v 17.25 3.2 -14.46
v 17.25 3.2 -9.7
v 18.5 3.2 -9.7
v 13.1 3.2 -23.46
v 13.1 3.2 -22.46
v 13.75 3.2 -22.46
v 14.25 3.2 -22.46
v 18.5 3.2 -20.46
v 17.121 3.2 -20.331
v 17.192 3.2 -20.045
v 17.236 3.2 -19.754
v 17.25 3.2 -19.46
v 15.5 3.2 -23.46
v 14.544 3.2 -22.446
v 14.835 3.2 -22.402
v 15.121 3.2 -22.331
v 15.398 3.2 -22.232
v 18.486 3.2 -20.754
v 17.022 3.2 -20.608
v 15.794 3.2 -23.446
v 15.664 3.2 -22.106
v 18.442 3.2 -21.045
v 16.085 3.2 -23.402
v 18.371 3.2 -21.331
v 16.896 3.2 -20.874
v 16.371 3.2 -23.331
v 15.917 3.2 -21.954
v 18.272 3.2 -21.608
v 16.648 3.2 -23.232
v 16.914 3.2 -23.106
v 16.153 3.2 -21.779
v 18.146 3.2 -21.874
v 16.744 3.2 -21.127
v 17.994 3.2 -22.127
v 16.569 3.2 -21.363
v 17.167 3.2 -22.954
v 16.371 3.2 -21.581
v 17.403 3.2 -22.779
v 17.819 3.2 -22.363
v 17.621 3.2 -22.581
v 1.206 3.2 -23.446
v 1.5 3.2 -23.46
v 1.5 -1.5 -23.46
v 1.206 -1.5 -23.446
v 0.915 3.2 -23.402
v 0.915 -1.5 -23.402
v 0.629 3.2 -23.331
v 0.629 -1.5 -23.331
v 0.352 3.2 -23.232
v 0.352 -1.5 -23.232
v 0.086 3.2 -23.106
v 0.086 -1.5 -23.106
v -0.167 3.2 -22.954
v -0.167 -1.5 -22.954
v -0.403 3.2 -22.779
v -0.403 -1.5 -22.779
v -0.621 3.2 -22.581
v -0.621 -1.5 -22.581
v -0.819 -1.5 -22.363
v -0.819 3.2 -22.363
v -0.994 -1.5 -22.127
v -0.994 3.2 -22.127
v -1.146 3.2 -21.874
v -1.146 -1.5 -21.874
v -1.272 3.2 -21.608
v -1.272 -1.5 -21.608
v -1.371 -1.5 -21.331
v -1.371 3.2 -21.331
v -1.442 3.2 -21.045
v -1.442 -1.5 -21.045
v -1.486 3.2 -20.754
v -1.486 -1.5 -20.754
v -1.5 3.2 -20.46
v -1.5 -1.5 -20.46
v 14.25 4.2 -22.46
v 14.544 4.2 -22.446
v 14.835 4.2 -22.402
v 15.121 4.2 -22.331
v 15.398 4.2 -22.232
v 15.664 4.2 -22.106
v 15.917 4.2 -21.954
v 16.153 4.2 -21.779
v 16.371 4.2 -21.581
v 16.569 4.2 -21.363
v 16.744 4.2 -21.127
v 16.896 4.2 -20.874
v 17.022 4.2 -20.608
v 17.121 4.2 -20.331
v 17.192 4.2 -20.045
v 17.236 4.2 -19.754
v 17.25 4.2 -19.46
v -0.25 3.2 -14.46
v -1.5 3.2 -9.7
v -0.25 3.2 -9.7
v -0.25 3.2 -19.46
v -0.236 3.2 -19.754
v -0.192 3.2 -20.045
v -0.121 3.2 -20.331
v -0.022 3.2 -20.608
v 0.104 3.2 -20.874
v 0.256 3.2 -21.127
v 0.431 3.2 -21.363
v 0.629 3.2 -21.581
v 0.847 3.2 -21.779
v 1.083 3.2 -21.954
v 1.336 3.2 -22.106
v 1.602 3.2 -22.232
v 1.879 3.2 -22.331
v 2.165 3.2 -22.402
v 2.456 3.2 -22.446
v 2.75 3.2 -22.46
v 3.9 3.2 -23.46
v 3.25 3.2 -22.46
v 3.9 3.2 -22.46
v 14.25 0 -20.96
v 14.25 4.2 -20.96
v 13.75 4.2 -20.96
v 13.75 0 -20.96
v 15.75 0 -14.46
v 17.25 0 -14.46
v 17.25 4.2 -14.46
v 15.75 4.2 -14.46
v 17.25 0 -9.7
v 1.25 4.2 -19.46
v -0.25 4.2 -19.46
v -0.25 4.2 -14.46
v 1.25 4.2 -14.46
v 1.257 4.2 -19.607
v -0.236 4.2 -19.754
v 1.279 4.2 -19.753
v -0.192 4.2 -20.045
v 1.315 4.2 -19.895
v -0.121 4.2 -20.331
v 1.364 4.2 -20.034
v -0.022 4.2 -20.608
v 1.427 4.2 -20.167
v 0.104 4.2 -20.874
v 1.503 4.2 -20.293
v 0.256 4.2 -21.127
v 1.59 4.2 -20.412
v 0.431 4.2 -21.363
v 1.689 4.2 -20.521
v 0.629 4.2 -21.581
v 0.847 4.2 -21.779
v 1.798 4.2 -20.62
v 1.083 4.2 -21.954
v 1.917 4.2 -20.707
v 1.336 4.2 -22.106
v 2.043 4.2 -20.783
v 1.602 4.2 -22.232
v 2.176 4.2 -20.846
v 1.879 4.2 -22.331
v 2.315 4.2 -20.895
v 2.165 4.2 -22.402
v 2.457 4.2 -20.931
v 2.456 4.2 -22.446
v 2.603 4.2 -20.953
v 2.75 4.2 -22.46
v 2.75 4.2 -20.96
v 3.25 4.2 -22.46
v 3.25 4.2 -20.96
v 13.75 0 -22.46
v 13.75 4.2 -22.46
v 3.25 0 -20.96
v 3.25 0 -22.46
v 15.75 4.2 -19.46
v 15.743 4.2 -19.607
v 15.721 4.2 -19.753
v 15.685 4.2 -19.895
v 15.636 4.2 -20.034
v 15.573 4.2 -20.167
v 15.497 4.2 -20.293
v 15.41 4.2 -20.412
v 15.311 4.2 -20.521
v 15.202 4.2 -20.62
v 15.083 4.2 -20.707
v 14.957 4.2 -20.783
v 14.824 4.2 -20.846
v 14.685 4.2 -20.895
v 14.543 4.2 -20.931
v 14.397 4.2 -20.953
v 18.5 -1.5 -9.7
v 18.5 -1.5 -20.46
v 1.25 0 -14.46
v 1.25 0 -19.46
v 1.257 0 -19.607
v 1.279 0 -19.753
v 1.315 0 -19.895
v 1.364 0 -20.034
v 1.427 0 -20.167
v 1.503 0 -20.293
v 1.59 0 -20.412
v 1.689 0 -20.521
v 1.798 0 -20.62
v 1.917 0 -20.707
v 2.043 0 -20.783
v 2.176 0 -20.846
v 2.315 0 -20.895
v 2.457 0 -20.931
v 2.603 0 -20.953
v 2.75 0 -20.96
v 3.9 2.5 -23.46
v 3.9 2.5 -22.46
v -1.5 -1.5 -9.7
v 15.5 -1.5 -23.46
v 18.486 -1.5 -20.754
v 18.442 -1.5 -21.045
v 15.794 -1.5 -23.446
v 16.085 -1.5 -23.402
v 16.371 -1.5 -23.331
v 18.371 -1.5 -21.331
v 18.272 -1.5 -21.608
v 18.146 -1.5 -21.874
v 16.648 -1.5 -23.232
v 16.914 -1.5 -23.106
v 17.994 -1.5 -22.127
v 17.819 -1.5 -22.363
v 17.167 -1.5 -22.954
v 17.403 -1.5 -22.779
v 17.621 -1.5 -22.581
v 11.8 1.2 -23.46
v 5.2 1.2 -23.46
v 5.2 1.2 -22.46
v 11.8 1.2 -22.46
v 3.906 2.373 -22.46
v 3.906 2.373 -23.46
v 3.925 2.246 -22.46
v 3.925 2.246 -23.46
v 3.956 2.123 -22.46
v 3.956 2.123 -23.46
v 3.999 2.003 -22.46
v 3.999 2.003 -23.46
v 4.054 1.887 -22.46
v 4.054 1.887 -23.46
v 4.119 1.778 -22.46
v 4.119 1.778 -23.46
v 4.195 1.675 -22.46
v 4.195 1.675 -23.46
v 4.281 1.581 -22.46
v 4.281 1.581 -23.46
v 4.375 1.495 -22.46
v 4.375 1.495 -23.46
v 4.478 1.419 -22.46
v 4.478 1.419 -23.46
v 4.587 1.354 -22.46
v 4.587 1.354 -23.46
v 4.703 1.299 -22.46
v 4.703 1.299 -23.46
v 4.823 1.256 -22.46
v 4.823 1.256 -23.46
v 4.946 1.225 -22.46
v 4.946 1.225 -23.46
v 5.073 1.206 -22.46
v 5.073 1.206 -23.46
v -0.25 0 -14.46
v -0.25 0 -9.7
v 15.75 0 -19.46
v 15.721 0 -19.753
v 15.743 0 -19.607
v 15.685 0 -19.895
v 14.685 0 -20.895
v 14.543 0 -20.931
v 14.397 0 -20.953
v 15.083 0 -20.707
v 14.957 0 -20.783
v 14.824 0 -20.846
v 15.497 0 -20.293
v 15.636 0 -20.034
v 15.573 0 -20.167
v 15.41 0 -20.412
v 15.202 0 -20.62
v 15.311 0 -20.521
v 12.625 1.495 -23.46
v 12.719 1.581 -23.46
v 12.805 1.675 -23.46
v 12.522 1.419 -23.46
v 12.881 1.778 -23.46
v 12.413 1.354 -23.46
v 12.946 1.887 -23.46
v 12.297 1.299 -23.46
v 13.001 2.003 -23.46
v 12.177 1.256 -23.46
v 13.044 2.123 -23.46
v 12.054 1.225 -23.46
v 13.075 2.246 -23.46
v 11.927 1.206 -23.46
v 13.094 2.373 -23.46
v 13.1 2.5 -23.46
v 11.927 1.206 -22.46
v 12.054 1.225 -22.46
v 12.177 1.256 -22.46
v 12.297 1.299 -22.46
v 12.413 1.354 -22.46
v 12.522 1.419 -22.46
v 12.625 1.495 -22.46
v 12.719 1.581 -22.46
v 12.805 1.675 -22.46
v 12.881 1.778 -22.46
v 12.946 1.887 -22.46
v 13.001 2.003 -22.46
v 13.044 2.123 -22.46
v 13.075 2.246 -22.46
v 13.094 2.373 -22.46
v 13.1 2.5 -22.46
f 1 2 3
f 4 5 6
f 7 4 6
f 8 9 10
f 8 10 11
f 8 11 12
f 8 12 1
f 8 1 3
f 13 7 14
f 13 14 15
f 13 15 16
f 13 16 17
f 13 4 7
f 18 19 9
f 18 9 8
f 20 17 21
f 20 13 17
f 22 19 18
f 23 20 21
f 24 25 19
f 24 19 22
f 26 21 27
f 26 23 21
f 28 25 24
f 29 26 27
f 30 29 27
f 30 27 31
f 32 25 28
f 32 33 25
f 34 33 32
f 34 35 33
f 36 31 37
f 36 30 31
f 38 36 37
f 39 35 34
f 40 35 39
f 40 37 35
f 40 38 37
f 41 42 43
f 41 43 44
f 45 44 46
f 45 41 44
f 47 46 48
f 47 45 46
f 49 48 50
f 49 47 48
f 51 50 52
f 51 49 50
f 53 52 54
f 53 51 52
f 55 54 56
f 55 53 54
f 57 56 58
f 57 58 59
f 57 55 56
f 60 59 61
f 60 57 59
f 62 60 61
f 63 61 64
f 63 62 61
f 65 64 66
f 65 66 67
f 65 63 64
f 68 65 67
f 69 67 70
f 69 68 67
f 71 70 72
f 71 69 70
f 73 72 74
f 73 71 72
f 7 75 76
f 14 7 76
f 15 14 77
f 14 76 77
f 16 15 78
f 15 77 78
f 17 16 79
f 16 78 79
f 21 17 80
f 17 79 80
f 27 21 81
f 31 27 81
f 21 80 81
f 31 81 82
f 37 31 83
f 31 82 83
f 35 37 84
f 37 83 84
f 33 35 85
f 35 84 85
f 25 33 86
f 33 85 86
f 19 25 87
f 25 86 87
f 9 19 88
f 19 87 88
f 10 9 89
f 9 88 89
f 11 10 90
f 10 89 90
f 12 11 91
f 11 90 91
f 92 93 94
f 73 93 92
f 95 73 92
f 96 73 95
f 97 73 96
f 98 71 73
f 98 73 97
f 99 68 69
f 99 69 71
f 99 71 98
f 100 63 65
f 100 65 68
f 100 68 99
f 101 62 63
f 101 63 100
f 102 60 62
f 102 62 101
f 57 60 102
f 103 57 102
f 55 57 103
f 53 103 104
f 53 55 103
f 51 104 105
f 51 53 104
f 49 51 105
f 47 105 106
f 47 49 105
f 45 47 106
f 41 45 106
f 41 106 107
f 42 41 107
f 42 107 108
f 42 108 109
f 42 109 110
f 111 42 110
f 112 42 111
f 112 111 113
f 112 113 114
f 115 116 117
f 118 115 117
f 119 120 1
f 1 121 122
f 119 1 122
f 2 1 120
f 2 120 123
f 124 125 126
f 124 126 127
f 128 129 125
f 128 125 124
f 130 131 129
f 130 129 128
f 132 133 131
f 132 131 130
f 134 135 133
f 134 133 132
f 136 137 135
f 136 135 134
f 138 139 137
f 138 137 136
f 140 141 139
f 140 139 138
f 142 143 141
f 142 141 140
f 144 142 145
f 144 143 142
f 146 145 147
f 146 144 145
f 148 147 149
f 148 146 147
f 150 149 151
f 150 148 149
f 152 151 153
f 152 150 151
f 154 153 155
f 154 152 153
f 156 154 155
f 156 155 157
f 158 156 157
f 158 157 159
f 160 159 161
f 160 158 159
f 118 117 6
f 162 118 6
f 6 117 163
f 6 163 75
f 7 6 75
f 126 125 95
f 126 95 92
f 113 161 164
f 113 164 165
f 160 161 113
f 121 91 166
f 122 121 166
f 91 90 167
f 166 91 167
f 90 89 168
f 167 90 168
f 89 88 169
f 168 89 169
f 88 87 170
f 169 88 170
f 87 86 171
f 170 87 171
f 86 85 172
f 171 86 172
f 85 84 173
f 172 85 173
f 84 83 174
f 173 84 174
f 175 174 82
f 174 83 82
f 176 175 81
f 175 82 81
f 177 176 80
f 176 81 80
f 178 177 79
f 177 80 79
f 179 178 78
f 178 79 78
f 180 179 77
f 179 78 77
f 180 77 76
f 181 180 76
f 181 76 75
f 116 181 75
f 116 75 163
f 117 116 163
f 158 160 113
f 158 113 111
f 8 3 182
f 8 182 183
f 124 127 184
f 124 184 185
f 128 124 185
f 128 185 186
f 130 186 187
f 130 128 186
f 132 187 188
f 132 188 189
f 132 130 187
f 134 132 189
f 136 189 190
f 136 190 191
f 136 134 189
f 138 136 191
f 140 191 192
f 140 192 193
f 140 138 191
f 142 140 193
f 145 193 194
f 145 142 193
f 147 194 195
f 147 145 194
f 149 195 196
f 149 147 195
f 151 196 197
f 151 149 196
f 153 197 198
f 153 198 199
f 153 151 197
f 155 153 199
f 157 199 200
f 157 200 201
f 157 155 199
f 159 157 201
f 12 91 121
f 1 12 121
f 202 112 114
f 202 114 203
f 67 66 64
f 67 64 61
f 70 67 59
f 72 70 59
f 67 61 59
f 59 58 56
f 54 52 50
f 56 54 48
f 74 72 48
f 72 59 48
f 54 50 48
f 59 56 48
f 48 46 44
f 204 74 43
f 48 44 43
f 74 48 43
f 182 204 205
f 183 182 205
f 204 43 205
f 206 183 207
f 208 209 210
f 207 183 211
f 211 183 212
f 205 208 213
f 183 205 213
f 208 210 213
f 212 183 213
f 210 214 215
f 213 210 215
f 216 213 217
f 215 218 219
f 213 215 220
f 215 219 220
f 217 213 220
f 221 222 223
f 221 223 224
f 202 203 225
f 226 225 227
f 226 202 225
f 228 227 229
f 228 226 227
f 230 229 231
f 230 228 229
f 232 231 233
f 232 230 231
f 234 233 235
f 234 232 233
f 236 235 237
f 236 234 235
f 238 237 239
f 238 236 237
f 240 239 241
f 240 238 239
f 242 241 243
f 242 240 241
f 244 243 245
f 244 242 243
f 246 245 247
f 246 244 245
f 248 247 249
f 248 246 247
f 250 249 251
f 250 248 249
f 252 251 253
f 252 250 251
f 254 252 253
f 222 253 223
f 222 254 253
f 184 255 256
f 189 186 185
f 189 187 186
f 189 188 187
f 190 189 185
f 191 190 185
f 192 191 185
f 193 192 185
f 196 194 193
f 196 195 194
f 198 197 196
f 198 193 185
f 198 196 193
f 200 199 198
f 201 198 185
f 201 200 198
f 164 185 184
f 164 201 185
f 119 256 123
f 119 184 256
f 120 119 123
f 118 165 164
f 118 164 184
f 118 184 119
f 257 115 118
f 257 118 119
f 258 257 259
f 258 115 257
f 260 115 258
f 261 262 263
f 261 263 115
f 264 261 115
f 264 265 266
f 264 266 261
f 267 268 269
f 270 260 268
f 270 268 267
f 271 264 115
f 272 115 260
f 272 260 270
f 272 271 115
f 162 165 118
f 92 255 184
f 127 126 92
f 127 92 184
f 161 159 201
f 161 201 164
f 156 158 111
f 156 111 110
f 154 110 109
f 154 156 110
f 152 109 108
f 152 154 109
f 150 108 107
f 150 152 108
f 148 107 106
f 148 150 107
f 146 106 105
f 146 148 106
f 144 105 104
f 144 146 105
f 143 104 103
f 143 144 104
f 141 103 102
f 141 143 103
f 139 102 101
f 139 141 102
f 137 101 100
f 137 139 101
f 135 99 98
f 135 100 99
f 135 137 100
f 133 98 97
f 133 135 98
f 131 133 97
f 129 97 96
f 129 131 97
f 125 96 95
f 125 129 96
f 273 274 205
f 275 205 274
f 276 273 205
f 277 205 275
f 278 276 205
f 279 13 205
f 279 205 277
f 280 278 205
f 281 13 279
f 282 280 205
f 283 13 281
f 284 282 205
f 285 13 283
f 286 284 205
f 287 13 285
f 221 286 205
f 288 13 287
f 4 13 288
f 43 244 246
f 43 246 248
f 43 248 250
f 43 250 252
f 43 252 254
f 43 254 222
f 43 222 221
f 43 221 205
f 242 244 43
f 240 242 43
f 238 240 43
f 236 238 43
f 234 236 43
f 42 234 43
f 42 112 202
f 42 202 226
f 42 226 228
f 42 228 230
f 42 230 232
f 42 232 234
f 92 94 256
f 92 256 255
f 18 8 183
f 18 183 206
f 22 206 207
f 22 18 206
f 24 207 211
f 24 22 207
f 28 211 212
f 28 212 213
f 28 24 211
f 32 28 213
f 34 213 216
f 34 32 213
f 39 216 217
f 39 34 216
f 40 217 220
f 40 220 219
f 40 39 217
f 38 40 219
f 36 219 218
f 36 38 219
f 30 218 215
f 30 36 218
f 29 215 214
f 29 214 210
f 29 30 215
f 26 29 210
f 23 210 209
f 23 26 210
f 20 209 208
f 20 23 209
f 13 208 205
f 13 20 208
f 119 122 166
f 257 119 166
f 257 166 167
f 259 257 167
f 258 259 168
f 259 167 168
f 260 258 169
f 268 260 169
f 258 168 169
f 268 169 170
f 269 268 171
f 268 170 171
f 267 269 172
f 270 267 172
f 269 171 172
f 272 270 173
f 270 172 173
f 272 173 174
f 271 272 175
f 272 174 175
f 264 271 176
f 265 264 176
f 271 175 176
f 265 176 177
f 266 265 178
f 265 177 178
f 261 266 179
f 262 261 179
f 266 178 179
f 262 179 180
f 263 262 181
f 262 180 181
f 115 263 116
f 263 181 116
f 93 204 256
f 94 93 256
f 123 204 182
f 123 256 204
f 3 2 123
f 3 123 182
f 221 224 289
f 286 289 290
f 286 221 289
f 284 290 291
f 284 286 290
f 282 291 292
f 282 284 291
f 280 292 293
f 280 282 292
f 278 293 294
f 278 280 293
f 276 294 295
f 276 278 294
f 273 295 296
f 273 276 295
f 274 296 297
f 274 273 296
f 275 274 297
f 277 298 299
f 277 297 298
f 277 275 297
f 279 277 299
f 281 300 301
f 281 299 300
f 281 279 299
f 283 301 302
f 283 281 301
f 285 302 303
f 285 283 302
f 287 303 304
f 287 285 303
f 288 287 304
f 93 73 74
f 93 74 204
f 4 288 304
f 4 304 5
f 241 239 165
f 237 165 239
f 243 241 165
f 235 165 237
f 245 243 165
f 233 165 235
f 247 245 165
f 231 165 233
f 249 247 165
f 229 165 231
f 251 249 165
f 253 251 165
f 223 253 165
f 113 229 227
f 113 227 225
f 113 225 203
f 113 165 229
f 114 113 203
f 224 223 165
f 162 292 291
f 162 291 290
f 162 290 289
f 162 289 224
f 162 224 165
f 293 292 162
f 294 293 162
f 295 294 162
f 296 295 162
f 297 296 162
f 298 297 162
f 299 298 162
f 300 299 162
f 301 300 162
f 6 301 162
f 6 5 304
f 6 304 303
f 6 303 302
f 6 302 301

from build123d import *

# Parameters (mm, degrees)
BOSS_EXTRUDE1_DEPTH = 1.5
BOSS_EXTRUDE2_START = 3.2
BOSS_EXTRUDE2_DEPTH = 3.2
BOSS_EXTRUDE3_START = 4.2
BOSS_EXTRUDE3_DEPTH = 4.2
CUT_EXTRUDE1_DEPTH  = 24.43560539


with BuildPart() as part:
    # Sketch1 → Boss-Extrude1 (new body)
    with BuildSketch(Plane(origin=(0, 0, 0), x_dir=(1, 0, 0), z_dir=(0, 1, 0))):
        with BuildLine():
            Line((-1.5, 20.46), (-1.5, 9.7))
            Line((-1.5, 9.7), (18.5, 9.7))
            Line((18.5, 9.7), (18.5, 20.46))
            ThreePointArc((18.5, 20.46), (17.621320344, 22.581320344), (15.5, 23.46))
            Line((15.5, 23.46), (1.5, 23.46))
            ThreePointArc((1.5, 23.46), (-0.621320344, 22.581320344), (-1.5, 20.46))
        make_face()
    extrude(amount=-BOSS_EXTRUDE1_DEPTH)

    # Sketch3 → Boss-Extrude2 (add)
    with BuildSketch(Plane(origin=(0, 0, 0), x_dir=(1, 0, 0), z_dir=(0, 1, 0)).offset(BOSS_EXTRUDE2_START)):
        with BuildLine():
            Line((2.75, 22.46), (14.25, 22.46))
            ThreePointArc((14.25, 22.46), (16.371320344, 21.581320344), (17.25, 19.46))
            Line((17.25, 19.46), (17.25, 9.7))
            Line((17.25, 9.7), (18.5, 9.7))
            Line((18.5, 9.7), (18.5, 20.46))
            ThreePointArc((18.5, 20.46), (17.621320344, 22.581320344), (15.5, 23.46))
            Line((15.5, 23.46), (1.5, 23.46))
            ThreePointArc((1.5, 23.46), (-0.621320344, 22.581320344), (-1.5, 20.46))
            Line((-1.5, 20.46), (-1.5, 9.7))
            Line((-1.5, 9.7), (-0.25, 9.7))
            Line((-0.25, 9.7), (-0.25, 19.46))
            ThreePointArc((-0.25, 19.46), (0.628679656, 21.581320344), (2.75, 22.46))
        make_face()
    extrude(amount=-BOSS_EXTRUDE2_DEPTH)

    # Sketch2 → Boss-Extrude3 (add)
    with BuildSketch(Plane(origin=(0, 0, 0), x_dir=(1, 0, 0), z_dir=(0, 1, 0)).offset(BOSS_EXTRUDE3_START)):
        with BuildLine():
            Line((2.75, 20.96), (3.25, 20.96))
            Line((3.25, 20.96), (3.25, 22.46))
            Line((3.25, 22.46), (2.75, 22.46))
            ThreePointArc((2.75, 22.46), (0.628679656, 21.581320344), (-0.25, 19.46))
            Line((-0.25, 19.46), (-0.25, 14.46))
            Line((-0.25, 14.46), (1.25, 14.46))
            Line((1.25, 14.46), (1.25, 19.46))
            ThreePointArc((1.25, 19.46), (1.689339828, 20.520660172), (2.75, 20.96))
        make_face()
        with BuildLine():
            Line((17.25, 19.46), (17.25, 14.46))
            Line((17.25, 14.46), (15.75, 14.46))
            Line((15.75, 14.46), (15.75, 19.46))
            ThreePointArc((15.75, 19.46), (15.310660172, 20.520660172), (14.25, 20.96))
            Line((14.25, 20.96), (13.75, 20.96))
            Line((13.75, 20.96), (13.75, 22.46))
            Line((13.75, 22.46), (14.25, 22.46))
            ThreePointArc((14.25, 22.46), (16.371320344, 21.581320344), (17.25, 19.46))
        make_face()
    extrude(amount=-BOSS_EXTRUDE3_DEPTH)

    # Sketch5 → Cut-Extrude1 (cut, through all)
    with BuildSketch(Plane(origin=(0, 0, -23.46), x_dir=(-1, 0, 0), z_dir=(0, 0, -1))):
        with BuildLine():
            Line((-13.1, 3.2), (-3.9, 3.2))
            Line((-3.9, 3.2), (-3.9, 2.5))
            ThreePointArc((-3.9, 2.5), (-4.280761184, 1.580761184), (-5.2, 1.2))
            Line((-5.2, 1.2), (-11.8, 1.2))
            ThreePointArc((-11.8, 1.2), (-12.719238816, 1.580761184), (-13.1, 2.5))
            Line((-13.1, 2.5), (-13.1, 3.2))
        make_face()
    extrude(amount=-CUT_EXTRUDE1_DEPTH, mode=Mode.SUBTRACT)


solid = part.part
